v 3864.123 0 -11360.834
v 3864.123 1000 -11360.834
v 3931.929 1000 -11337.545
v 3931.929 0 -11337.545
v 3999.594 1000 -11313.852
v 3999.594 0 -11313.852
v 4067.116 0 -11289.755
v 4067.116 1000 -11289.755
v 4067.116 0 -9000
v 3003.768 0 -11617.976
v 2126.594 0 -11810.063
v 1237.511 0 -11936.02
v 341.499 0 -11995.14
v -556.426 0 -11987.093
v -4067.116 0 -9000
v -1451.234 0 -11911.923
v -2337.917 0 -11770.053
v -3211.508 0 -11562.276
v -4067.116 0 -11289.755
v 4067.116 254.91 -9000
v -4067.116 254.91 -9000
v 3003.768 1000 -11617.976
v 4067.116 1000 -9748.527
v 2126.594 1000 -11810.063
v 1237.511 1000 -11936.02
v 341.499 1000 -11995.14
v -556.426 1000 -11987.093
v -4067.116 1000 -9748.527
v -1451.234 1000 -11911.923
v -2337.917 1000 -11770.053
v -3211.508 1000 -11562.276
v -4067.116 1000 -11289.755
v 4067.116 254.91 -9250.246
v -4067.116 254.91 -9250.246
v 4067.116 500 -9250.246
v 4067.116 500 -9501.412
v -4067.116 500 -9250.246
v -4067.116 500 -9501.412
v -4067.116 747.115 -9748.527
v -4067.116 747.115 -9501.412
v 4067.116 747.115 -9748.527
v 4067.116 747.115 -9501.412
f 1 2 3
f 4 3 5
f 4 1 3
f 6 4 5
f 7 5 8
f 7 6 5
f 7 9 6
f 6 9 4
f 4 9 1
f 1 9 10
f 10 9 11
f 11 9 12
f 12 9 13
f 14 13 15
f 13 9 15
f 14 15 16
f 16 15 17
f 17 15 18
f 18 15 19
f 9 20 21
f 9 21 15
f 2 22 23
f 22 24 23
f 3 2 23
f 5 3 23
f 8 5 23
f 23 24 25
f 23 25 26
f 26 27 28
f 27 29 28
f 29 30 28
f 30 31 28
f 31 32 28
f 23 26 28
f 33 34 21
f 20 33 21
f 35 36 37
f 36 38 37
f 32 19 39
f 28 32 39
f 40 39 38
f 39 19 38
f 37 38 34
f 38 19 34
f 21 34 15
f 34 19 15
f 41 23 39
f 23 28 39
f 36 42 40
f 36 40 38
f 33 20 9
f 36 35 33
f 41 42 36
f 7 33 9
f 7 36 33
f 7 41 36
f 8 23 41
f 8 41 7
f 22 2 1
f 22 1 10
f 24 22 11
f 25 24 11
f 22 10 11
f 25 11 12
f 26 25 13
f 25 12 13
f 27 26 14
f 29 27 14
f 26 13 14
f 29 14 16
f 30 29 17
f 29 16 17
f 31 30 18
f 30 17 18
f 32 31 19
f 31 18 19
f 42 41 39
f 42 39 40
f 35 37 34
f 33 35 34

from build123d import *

# Parameters (mm, degrees)
BOSS_EXTRUDE1_DEPTH = 1000
CUT_EXTRUDE1_DEPTH  = 24000
BOSS_EXTRUDE2_DEPTH = 202.99281
CUT_EXTRUDE5_START  = -4000
CUT_EXTRUDE5_DEPTH  = 4000


with BuildPart() as part:
    # Sketch1 → Boss-Extrude1 (new body)
    with BuildSketch(Plane(origin=(0, 0, 0), x_dir=(1, 0, 0), z_dir=(0, 1, 0))):
        with BuildLine():
            Line((-4067.116172071, 9000), (3864.123361974, 9000))
            Line((3864.123361974, 9000), (3864.123361974, 11360.834064603))
            ThreePointArc((3864.123361974, 11360.834064603), (1958.314482503, 11839.130220908), (0, 12000))
            ThreePointArc((0, 12000), (-2064.332945394, 11821.105256725), (-4067.116172071, 11289.754915094))
            Line((-4067.116172071, 11289.754915094), (-4067.116172071, 9000))
        make_face()
    extrude(amount=BOSS_EXTRUDE1_DEPTH)

    # Sketch2 → Cut-Extrude1 (cut)
    with BuildSketch(Plane(origin=(3864.123361974, 0, 0), x_dir=(0, 0, -1), z_dir=(1, 0, 0))):
        Polygon((9000, 254.910429711), (9250.24574489, 254.910429711), (9250.24574489, 500), (9501.411916095, 500), (9501.411916095, 747.115103928), (9748.527020023, 747.115103928), (9748.527020023, 1000), (9000, 1000), align=None)
    extrude(amount=-CUT_EXTRUDE1_DEPTH, mode=Mode.SUBTRACT)

    # Sketch4 → Boss-Extrude2 (add)
    with BuildSketch(Plane(origin=(3864.123361974, 0, 0), x_dir=(0, 0, -1), z_dir=(1, 0, 0))):
        Polygon((9000, 254.910429711), (9000, 0), (11360.834064603, 0), (11360.834064603, 1000), (9748.527020023, 1000), (9748.527020023, 747.115103928), (9501.411916095, 747.115103928), (9501.411916095, 500), (9250.24574489, 500), (9250.24574489, 254.910429711), align=None)
    extrude(amount=BOSS_EXTRUDE2_DEPTH)

    # Sketch5 → Cut-Extrude5 (cut)
    with BuildSketch(Plane(origin=(0, 1000, 0), x_dir=(1, 0, 0), z_dir=(0, 1, 0)).offset(CUT_EXTRUDE5_START)):
        with BuildLine():
            Line((4067.116172071, 11289.754915094), (4067.116171974, 11360.834064603))
            Line((4067.116171974, 11360.834064603), (3864.123361974, 11360.834064603))
            ThreePointArc((3864.123361974, 11360.834064603), (3965.779015272, 11325.749282146), (4067.116172071, 11289.754915094))
        make_face()
    extrude(amount=CUT_EXTRUDE5_DEPTH, mode=Mode.SUBTRACT)


solid = part.part
